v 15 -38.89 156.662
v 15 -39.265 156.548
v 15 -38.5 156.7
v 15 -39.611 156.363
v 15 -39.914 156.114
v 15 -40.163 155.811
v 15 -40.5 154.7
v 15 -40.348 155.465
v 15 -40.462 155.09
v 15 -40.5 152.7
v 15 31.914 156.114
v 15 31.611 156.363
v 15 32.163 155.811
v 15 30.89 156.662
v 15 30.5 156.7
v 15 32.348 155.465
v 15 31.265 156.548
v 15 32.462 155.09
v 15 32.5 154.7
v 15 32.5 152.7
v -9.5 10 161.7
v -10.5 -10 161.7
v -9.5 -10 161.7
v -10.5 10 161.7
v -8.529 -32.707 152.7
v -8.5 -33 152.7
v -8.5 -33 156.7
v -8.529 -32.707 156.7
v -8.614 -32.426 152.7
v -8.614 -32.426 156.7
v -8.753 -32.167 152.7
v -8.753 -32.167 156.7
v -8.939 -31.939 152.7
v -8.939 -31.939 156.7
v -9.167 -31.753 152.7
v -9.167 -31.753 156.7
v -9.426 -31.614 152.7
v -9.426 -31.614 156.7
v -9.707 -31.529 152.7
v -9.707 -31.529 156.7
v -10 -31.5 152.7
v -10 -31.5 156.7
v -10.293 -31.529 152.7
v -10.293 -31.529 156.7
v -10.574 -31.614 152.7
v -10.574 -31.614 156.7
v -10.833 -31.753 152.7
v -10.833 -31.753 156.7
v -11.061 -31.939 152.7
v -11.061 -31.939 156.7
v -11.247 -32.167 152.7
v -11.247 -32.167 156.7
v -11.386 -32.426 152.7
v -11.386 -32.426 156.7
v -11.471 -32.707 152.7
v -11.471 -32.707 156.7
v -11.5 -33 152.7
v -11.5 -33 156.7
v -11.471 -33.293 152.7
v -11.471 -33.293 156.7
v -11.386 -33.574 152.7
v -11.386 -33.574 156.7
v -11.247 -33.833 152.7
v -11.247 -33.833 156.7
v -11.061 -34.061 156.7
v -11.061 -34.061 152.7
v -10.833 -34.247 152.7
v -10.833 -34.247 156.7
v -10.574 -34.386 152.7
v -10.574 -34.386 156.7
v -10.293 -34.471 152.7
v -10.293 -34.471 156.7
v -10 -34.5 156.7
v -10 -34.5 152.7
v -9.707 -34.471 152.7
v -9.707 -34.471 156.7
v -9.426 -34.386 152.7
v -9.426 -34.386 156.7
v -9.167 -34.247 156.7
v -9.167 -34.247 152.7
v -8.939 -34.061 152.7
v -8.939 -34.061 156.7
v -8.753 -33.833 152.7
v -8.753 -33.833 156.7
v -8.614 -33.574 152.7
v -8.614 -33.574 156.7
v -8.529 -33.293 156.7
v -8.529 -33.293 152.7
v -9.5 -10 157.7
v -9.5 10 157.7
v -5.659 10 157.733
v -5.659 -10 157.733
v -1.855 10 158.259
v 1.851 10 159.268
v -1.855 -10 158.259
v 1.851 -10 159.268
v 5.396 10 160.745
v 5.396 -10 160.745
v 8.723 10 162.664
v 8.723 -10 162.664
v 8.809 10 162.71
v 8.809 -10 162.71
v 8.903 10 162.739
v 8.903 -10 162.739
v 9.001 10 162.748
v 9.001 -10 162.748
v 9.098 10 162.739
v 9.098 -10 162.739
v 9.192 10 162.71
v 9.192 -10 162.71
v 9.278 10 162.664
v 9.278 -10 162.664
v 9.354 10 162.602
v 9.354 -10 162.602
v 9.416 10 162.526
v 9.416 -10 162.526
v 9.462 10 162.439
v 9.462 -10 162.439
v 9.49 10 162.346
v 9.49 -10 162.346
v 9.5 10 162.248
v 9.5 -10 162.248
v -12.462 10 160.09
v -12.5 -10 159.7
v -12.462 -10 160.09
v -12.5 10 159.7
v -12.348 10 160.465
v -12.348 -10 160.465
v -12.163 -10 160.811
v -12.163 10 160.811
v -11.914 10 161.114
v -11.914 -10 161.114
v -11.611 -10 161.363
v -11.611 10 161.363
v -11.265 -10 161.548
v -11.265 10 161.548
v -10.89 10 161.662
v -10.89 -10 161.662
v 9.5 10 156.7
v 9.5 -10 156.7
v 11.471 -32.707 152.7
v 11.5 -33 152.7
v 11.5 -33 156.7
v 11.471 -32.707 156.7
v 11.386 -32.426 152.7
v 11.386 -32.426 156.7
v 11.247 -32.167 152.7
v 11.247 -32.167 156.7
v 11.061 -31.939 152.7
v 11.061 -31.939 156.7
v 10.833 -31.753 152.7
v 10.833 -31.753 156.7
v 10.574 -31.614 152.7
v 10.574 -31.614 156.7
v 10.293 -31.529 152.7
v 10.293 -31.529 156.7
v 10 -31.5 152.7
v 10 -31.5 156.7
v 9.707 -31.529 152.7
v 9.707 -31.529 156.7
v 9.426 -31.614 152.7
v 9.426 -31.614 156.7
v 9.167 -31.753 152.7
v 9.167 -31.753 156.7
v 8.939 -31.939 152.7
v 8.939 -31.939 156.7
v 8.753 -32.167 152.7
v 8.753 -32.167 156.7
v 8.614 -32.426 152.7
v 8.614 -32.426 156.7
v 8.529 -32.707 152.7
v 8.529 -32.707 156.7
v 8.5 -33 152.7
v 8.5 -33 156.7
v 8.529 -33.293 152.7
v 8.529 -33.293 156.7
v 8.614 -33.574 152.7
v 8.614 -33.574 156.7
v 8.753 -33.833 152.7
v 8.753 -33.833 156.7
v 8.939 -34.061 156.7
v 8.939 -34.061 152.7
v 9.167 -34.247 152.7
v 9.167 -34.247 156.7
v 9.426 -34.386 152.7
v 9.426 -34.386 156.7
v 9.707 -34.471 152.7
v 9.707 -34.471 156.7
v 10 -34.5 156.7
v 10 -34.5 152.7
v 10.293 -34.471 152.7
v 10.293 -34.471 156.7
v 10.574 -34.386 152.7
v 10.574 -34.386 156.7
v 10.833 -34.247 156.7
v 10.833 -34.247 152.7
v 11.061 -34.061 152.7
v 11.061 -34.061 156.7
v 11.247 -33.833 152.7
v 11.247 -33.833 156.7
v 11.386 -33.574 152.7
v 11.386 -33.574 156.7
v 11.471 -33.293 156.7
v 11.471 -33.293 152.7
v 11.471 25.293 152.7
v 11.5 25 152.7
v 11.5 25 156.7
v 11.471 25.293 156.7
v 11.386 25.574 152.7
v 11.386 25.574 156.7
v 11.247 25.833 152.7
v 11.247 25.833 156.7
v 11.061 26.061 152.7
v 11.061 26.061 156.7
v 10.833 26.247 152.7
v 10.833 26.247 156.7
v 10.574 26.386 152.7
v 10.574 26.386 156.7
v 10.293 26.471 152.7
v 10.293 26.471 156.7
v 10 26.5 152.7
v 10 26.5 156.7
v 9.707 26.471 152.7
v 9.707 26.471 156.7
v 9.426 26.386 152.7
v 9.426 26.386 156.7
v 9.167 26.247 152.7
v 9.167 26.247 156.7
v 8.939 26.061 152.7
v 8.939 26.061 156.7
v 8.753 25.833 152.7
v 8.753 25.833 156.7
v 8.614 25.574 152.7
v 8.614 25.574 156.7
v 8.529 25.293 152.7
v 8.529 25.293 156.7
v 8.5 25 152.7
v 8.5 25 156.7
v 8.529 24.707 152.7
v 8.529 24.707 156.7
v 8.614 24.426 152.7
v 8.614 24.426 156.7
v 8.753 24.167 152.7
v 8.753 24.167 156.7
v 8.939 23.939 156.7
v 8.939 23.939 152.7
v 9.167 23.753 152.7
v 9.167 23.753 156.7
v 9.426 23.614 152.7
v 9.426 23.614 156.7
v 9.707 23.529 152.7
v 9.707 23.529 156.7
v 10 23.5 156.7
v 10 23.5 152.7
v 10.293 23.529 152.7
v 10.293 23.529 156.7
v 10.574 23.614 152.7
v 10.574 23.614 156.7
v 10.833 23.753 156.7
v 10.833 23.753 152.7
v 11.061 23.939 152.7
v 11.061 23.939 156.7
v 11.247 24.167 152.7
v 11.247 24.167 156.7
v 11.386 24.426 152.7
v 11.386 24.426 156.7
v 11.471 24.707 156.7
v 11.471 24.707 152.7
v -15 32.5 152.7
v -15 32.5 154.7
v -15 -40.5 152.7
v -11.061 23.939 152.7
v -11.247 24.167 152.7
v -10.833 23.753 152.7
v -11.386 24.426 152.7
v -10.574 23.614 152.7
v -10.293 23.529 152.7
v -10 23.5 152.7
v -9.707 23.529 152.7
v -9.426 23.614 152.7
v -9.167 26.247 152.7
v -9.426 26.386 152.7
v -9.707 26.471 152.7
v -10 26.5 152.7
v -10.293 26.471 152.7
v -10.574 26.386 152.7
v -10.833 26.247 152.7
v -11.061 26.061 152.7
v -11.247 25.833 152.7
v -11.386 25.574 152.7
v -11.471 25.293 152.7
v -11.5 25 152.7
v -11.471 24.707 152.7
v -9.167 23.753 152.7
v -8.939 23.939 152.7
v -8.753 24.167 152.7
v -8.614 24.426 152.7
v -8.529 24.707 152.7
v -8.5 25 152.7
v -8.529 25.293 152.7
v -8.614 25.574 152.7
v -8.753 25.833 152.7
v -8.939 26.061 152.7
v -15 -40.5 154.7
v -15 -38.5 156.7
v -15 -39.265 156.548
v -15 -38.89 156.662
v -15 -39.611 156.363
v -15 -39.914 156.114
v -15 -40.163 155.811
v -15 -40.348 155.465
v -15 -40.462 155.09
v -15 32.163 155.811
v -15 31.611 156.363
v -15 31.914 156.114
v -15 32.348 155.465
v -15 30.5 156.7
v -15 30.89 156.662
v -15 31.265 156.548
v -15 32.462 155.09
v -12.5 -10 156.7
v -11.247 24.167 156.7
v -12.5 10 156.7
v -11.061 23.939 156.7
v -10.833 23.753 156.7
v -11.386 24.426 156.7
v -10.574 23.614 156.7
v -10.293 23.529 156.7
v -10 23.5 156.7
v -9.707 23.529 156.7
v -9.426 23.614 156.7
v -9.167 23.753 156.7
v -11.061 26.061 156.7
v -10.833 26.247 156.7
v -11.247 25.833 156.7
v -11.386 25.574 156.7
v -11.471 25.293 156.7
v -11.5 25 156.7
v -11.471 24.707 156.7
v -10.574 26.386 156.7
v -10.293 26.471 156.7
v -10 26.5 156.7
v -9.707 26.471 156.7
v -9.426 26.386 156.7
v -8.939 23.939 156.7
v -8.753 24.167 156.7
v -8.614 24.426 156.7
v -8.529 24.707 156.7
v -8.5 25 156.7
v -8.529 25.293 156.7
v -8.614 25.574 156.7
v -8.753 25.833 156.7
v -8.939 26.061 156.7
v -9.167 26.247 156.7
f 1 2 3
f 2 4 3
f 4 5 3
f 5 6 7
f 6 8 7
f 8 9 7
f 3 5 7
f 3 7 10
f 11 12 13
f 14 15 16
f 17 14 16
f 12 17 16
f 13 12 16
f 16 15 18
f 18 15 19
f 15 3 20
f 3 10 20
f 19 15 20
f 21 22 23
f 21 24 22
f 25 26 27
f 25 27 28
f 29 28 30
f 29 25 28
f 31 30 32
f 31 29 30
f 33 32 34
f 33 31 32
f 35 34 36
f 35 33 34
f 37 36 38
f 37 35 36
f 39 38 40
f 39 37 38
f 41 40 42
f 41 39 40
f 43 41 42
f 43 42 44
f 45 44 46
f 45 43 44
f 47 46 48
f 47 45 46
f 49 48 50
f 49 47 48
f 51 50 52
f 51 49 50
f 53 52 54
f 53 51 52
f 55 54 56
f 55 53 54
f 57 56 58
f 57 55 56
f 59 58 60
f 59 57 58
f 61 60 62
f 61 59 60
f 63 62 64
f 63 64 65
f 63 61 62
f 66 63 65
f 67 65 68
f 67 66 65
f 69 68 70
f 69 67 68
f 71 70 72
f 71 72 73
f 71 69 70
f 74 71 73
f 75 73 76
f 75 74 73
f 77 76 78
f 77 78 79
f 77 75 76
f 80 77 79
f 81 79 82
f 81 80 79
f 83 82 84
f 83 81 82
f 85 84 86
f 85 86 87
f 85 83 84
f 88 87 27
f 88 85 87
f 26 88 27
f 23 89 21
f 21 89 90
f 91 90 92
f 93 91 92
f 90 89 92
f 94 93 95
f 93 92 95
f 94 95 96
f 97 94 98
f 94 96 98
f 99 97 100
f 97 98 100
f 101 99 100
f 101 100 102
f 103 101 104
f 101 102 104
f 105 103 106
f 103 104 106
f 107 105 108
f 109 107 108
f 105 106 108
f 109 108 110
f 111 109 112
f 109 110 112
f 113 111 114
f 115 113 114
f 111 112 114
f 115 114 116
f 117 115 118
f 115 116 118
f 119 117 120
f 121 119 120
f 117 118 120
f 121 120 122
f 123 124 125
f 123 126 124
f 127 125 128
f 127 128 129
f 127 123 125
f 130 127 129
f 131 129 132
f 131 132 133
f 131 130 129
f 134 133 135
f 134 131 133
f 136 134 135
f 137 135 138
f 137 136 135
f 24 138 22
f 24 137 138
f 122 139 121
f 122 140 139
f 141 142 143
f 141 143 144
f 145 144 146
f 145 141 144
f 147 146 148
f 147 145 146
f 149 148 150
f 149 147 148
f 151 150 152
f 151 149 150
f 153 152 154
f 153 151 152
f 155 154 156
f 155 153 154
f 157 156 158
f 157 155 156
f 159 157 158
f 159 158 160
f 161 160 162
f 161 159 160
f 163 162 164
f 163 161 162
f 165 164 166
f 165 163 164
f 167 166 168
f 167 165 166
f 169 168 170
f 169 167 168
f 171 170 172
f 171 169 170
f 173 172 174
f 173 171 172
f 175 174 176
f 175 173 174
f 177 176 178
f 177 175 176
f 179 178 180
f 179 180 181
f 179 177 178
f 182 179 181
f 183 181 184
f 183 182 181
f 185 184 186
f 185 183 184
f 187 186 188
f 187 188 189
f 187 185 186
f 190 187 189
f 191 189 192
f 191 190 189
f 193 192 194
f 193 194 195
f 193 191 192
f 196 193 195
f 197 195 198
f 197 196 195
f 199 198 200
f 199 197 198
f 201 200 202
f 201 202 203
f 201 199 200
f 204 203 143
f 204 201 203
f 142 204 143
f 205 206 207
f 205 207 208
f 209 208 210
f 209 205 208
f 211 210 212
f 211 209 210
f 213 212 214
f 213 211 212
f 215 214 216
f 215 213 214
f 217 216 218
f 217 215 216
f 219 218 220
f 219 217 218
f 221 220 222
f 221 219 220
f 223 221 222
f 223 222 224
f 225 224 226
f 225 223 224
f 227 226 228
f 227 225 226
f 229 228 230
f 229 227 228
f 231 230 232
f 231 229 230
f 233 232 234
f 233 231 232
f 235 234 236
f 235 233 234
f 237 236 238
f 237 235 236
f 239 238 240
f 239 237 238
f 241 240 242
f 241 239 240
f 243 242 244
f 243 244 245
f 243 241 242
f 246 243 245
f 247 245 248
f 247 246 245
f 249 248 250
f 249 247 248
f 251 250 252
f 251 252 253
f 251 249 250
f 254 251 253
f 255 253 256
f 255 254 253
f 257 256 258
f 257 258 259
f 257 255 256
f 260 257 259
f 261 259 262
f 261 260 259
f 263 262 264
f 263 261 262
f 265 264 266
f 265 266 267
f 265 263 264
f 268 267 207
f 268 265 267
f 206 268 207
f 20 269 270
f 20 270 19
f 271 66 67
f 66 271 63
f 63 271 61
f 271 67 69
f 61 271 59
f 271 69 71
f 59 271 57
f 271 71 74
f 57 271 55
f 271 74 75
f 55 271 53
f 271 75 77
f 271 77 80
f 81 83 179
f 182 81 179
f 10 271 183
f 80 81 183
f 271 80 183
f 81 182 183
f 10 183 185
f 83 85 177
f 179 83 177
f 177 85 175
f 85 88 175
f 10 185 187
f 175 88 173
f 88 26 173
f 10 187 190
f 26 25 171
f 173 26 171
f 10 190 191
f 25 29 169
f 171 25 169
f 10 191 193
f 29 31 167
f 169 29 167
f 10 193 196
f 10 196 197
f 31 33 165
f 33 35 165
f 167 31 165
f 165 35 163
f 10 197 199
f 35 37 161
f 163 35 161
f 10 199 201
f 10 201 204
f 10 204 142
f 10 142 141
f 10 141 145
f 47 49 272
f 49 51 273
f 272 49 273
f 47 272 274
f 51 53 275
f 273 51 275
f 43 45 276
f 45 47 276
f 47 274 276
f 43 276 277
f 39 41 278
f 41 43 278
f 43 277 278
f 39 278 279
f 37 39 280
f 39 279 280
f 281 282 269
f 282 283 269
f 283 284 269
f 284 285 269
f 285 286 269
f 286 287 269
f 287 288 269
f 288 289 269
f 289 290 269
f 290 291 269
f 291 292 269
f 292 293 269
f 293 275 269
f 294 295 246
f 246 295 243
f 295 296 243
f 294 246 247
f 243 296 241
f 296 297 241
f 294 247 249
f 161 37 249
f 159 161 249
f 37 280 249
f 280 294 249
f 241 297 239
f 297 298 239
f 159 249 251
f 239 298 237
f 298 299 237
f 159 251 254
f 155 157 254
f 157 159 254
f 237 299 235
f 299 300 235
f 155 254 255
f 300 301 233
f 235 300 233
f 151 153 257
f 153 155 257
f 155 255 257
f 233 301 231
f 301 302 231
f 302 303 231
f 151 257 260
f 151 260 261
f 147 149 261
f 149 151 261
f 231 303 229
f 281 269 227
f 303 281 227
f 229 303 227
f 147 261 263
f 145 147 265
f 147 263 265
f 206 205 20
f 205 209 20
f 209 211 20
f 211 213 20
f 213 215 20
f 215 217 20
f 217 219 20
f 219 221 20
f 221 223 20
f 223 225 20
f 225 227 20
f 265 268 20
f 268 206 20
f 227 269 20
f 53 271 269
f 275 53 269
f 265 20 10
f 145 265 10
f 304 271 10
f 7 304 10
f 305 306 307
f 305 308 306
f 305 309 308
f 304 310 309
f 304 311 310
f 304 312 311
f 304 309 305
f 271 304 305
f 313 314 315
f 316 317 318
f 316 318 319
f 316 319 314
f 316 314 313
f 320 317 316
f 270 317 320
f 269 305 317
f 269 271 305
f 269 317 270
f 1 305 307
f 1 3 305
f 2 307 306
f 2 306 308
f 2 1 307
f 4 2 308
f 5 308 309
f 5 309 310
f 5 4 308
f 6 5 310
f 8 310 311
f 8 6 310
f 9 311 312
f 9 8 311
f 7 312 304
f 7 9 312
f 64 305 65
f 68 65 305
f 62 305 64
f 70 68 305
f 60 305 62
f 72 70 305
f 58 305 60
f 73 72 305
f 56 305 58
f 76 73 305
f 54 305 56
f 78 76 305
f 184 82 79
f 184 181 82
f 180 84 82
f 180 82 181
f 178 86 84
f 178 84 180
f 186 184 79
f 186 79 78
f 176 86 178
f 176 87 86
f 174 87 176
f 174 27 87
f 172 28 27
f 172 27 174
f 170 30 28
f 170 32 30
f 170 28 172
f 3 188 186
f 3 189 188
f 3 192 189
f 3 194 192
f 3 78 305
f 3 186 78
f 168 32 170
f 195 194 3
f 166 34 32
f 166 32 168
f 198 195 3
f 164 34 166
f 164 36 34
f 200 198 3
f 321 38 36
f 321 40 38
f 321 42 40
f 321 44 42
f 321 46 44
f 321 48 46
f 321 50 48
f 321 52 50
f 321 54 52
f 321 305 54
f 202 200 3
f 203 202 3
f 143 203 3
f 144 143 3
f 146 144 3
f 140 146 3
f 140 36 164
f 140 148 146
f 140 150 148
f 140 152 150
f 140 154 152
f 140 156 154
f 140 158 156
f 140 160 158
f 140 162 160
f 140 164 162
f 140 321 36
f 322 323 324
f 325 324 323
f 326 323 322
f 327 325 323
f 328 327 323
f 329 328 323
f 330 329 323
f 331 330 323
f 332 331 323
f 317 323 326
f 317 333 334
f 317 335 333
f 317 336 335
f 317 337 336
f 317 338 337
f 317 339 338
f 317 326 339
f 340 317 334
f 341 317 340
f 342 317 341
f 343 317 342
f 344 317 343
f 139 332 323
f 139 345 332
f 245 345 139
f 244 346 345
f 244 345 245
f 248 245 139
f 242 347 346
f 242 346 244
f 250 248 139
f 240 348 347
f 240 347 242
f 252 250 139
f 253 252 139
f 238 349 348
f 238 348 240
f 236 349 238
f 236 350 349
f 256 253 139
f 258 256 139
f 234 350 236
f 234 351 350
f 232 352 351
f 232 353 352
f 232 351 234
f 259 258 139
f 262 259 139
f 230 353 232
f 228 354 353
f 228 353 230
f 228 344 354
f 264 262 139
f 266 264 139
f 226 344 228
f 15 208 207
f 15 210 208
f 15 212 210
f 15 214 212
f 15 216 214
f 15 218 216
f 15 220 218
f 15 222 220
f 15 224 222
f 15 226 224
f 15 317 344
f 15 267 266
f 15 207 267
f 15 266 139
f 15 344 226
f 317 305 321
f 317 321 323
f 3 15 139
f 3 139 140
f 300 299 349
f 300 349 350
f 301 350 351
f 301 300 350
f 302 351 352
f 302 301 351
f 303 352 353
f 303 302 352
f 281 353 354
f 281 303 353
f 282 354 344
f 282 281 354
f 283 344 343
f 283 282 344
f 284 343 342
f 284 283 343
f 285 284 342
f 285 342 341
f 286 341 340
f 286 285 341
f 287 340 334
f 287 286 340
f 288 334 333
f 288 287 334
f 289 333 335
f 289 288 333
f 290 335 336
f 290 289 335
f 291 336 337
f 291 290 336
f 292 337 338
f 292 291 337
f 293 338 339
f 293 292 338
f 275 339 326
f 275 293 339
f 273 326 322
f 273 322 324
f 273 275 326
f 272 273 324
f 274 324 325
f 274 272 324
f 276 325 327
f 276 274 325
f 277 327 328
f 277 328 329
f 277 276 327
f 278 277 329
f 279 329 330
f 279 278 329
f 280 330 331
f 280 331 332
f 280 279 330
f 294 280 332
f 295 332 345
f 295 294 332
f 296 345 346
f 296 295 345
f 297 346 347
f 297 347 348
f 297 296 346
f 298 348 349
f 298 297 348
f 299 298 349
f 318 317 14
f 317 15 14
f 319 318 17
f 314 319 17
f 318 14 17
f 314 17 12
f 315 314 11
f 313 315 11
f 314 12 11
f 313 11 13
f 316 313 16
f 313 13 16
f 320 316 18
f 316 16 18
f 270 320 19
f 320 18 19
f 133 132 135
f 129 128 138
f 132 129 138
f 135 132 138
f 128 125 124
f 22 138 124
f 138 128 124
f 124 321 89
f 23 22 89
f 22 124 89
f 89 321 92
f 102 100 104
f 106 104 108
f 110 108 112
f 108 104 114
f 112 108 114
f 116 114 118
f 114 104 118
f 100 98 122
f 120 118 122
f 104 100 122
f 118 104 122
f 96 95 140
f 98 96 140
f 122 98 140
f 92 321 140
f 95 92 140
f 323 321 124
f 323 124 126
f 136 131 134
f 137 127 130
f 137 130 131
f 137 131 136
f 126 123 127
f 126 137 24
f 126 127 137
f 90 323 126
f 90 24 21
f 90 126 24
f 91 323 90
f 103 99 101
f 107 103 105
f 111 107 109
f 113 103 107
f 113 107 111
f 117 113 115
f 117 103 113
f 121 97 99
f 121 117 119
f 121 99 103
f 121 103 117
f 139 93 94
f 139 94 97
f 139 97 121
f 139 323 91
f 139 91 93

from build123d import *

# Parameters (mm, degrees)
CYLINDER072_R     = 1.5
CYLINDER072_DEPTH = 4
CYLINDER071_R     = 1.5
CYLINDER071_DEPTH = 4
CYLINDER073_R     = 1.5
CYLINDER073_DEPTH = 4
CYLINDER070_R     = 1.5
CYLINDER070_DEPTH = 4
EXTRUDE004_DEPTH  = 10
FILLET007_R       = 0.5
BOX017_W          = 3
BOX017_H          = 20
BOX017_DEPTH      = 5
FILLET009_R       = 2
BOX016_W          = 30
BOX016_H          = 73
BOX016_DEPTH      = 4
FILLET008_R       = 2


with BuildPart() as payload_plate_screw009:
    # Cylinder072 → Cylinder072 (new body)
    with BuildSketch(Plane(origin=(-10, 25, 152.7), x_dir=(1, 0, 0), z_dir=(0, 0, 1))):
        Circle(CYLINDER072_R)
    extrude(amount=CYLINDER072_DEPTH)


with BuildPart() as payload_plate_screw008:
    # Cylinder071 → Cylinder071 (new body)
    with BuildSketch(Plane(origin=(-10, -33, 152.7), x_dir=(1, 0, 0), z_dir=(0, 0, 1))):
        Circle(CYLINDER071_R)
    extrude(amount=CYLINDER071_DEPTH)


with BuildPart() as payload_plate_screw010:
    # Cylinder073 → Cylinder073 (new body)
    with BuildSketch(Plane(origin=(10, 25, 152.7), x_dir=(1, 0, 0), z_dir=(0, 0, 1))):
        Circle(CYLINDER073_R)
    extrude(amount=CYLINDER073_DEPTH)


with BuildPart() as payload_plate_screw_holes001:
    # Cylinder070 → Cylinder070 (new body)
    with BuildSketch(Plane(origin=(10, -33, 152.7), x_dir=(1, 0, 0), z_dir=(0, 0, 1))):
        Circle(CYLINDER070_R)
    extrude(amount=CYLINDER070_DEPTH)

    # Compound009: union payload-plate-screw009, payload-plate-screw008, payload-plate-screw010
    add(payload_plate_screw009.part)
    add(payload_plate_screw008.part)
    add(payload_plate_screw010.part)


with BuildPart() as webcam_cradle:
    # Sketch → Extrude004 (new body, symmetric)
    with BuildSketch(Plane.XZ):
        with BuildLine():
            Line((-9.5, 0), (9.5, 0))
            Line((9.5, 0), (9.5, 6.5))
            ThreePointArc((-9.5, 1), (0.468514, 2.131496), (9.5, 6.5))
            Line((-9.5, 0), (-9.5, 1))
        make_face()
    extrude(amount=EXTRUDE004_DEPTH, both=True)

    # Fillet007
    fillet007_edges = [webcam_cradle.edges().sort_by_distance(p)[0] for p in [
        (9.5, 0, 6.5),
    ]]
    fillet(fillet007_edges, radius=FILLET007_R)


with BuildPart() as webcam_cradle_1:
    # Fillet007 placement: moved
    add(webcam_cradle.part.moved(Location((0, 0, 156.7))))


with BuildPart() as from_stop:
    # Box017 → Box017 (new body)
    with BuildSketch(Plane(origin=(-12.5, -10, 156.7), x_dir=(1, 0, 0), z_dir=(0, 0, 1))):
        with Locations((1.5, 10)):
            Rectangle(BOX017_W, BOX017_H)
    extrude(amount=BOX017_DEPTH)

    # Fillet009
    fillet009_edges = [from_stop.edges().sort_by_distance(p)[0] for p in [
        (-12.5, 0, 161.7),
    ]]
    fillet(fillet009_edges, radius=FILLET009_R)


with BuildPart() as payload_plate_webcam:
    # Box016 → Box016 (new body)
    with BuildSketch(Plane(origin=(-15, -40.5, 152.7), x_dir=(1, 0, 0), z_dir=(0, 0, 1))):
        with Locations((15, 36.5)):
            Rectangle(BOX016_W, BOX016_H)
    extrude(amount=BOX016_DEPTH)

    # Fusion030: union webcam-cradle, from-stop
    add(webcam_cradle_1.part)
    add(from_stop.part)

    # Fillet008
    fillet008_edges = [payload_plate_webcam.edges().sort_by_distance(p)[0] for p in [
        (0, -40.5, 156.7),
        (0, 32.5, 156.7),
    ]]
    fillet(fillet008_edges, radius=FILLET008_R)

    # Cut054: cut payload-plate-screw-holes001
    add(payload_plate_screw_holes001.part, mode=Mode.SUBTRACT)


solid = payload_plate_webcam.part
